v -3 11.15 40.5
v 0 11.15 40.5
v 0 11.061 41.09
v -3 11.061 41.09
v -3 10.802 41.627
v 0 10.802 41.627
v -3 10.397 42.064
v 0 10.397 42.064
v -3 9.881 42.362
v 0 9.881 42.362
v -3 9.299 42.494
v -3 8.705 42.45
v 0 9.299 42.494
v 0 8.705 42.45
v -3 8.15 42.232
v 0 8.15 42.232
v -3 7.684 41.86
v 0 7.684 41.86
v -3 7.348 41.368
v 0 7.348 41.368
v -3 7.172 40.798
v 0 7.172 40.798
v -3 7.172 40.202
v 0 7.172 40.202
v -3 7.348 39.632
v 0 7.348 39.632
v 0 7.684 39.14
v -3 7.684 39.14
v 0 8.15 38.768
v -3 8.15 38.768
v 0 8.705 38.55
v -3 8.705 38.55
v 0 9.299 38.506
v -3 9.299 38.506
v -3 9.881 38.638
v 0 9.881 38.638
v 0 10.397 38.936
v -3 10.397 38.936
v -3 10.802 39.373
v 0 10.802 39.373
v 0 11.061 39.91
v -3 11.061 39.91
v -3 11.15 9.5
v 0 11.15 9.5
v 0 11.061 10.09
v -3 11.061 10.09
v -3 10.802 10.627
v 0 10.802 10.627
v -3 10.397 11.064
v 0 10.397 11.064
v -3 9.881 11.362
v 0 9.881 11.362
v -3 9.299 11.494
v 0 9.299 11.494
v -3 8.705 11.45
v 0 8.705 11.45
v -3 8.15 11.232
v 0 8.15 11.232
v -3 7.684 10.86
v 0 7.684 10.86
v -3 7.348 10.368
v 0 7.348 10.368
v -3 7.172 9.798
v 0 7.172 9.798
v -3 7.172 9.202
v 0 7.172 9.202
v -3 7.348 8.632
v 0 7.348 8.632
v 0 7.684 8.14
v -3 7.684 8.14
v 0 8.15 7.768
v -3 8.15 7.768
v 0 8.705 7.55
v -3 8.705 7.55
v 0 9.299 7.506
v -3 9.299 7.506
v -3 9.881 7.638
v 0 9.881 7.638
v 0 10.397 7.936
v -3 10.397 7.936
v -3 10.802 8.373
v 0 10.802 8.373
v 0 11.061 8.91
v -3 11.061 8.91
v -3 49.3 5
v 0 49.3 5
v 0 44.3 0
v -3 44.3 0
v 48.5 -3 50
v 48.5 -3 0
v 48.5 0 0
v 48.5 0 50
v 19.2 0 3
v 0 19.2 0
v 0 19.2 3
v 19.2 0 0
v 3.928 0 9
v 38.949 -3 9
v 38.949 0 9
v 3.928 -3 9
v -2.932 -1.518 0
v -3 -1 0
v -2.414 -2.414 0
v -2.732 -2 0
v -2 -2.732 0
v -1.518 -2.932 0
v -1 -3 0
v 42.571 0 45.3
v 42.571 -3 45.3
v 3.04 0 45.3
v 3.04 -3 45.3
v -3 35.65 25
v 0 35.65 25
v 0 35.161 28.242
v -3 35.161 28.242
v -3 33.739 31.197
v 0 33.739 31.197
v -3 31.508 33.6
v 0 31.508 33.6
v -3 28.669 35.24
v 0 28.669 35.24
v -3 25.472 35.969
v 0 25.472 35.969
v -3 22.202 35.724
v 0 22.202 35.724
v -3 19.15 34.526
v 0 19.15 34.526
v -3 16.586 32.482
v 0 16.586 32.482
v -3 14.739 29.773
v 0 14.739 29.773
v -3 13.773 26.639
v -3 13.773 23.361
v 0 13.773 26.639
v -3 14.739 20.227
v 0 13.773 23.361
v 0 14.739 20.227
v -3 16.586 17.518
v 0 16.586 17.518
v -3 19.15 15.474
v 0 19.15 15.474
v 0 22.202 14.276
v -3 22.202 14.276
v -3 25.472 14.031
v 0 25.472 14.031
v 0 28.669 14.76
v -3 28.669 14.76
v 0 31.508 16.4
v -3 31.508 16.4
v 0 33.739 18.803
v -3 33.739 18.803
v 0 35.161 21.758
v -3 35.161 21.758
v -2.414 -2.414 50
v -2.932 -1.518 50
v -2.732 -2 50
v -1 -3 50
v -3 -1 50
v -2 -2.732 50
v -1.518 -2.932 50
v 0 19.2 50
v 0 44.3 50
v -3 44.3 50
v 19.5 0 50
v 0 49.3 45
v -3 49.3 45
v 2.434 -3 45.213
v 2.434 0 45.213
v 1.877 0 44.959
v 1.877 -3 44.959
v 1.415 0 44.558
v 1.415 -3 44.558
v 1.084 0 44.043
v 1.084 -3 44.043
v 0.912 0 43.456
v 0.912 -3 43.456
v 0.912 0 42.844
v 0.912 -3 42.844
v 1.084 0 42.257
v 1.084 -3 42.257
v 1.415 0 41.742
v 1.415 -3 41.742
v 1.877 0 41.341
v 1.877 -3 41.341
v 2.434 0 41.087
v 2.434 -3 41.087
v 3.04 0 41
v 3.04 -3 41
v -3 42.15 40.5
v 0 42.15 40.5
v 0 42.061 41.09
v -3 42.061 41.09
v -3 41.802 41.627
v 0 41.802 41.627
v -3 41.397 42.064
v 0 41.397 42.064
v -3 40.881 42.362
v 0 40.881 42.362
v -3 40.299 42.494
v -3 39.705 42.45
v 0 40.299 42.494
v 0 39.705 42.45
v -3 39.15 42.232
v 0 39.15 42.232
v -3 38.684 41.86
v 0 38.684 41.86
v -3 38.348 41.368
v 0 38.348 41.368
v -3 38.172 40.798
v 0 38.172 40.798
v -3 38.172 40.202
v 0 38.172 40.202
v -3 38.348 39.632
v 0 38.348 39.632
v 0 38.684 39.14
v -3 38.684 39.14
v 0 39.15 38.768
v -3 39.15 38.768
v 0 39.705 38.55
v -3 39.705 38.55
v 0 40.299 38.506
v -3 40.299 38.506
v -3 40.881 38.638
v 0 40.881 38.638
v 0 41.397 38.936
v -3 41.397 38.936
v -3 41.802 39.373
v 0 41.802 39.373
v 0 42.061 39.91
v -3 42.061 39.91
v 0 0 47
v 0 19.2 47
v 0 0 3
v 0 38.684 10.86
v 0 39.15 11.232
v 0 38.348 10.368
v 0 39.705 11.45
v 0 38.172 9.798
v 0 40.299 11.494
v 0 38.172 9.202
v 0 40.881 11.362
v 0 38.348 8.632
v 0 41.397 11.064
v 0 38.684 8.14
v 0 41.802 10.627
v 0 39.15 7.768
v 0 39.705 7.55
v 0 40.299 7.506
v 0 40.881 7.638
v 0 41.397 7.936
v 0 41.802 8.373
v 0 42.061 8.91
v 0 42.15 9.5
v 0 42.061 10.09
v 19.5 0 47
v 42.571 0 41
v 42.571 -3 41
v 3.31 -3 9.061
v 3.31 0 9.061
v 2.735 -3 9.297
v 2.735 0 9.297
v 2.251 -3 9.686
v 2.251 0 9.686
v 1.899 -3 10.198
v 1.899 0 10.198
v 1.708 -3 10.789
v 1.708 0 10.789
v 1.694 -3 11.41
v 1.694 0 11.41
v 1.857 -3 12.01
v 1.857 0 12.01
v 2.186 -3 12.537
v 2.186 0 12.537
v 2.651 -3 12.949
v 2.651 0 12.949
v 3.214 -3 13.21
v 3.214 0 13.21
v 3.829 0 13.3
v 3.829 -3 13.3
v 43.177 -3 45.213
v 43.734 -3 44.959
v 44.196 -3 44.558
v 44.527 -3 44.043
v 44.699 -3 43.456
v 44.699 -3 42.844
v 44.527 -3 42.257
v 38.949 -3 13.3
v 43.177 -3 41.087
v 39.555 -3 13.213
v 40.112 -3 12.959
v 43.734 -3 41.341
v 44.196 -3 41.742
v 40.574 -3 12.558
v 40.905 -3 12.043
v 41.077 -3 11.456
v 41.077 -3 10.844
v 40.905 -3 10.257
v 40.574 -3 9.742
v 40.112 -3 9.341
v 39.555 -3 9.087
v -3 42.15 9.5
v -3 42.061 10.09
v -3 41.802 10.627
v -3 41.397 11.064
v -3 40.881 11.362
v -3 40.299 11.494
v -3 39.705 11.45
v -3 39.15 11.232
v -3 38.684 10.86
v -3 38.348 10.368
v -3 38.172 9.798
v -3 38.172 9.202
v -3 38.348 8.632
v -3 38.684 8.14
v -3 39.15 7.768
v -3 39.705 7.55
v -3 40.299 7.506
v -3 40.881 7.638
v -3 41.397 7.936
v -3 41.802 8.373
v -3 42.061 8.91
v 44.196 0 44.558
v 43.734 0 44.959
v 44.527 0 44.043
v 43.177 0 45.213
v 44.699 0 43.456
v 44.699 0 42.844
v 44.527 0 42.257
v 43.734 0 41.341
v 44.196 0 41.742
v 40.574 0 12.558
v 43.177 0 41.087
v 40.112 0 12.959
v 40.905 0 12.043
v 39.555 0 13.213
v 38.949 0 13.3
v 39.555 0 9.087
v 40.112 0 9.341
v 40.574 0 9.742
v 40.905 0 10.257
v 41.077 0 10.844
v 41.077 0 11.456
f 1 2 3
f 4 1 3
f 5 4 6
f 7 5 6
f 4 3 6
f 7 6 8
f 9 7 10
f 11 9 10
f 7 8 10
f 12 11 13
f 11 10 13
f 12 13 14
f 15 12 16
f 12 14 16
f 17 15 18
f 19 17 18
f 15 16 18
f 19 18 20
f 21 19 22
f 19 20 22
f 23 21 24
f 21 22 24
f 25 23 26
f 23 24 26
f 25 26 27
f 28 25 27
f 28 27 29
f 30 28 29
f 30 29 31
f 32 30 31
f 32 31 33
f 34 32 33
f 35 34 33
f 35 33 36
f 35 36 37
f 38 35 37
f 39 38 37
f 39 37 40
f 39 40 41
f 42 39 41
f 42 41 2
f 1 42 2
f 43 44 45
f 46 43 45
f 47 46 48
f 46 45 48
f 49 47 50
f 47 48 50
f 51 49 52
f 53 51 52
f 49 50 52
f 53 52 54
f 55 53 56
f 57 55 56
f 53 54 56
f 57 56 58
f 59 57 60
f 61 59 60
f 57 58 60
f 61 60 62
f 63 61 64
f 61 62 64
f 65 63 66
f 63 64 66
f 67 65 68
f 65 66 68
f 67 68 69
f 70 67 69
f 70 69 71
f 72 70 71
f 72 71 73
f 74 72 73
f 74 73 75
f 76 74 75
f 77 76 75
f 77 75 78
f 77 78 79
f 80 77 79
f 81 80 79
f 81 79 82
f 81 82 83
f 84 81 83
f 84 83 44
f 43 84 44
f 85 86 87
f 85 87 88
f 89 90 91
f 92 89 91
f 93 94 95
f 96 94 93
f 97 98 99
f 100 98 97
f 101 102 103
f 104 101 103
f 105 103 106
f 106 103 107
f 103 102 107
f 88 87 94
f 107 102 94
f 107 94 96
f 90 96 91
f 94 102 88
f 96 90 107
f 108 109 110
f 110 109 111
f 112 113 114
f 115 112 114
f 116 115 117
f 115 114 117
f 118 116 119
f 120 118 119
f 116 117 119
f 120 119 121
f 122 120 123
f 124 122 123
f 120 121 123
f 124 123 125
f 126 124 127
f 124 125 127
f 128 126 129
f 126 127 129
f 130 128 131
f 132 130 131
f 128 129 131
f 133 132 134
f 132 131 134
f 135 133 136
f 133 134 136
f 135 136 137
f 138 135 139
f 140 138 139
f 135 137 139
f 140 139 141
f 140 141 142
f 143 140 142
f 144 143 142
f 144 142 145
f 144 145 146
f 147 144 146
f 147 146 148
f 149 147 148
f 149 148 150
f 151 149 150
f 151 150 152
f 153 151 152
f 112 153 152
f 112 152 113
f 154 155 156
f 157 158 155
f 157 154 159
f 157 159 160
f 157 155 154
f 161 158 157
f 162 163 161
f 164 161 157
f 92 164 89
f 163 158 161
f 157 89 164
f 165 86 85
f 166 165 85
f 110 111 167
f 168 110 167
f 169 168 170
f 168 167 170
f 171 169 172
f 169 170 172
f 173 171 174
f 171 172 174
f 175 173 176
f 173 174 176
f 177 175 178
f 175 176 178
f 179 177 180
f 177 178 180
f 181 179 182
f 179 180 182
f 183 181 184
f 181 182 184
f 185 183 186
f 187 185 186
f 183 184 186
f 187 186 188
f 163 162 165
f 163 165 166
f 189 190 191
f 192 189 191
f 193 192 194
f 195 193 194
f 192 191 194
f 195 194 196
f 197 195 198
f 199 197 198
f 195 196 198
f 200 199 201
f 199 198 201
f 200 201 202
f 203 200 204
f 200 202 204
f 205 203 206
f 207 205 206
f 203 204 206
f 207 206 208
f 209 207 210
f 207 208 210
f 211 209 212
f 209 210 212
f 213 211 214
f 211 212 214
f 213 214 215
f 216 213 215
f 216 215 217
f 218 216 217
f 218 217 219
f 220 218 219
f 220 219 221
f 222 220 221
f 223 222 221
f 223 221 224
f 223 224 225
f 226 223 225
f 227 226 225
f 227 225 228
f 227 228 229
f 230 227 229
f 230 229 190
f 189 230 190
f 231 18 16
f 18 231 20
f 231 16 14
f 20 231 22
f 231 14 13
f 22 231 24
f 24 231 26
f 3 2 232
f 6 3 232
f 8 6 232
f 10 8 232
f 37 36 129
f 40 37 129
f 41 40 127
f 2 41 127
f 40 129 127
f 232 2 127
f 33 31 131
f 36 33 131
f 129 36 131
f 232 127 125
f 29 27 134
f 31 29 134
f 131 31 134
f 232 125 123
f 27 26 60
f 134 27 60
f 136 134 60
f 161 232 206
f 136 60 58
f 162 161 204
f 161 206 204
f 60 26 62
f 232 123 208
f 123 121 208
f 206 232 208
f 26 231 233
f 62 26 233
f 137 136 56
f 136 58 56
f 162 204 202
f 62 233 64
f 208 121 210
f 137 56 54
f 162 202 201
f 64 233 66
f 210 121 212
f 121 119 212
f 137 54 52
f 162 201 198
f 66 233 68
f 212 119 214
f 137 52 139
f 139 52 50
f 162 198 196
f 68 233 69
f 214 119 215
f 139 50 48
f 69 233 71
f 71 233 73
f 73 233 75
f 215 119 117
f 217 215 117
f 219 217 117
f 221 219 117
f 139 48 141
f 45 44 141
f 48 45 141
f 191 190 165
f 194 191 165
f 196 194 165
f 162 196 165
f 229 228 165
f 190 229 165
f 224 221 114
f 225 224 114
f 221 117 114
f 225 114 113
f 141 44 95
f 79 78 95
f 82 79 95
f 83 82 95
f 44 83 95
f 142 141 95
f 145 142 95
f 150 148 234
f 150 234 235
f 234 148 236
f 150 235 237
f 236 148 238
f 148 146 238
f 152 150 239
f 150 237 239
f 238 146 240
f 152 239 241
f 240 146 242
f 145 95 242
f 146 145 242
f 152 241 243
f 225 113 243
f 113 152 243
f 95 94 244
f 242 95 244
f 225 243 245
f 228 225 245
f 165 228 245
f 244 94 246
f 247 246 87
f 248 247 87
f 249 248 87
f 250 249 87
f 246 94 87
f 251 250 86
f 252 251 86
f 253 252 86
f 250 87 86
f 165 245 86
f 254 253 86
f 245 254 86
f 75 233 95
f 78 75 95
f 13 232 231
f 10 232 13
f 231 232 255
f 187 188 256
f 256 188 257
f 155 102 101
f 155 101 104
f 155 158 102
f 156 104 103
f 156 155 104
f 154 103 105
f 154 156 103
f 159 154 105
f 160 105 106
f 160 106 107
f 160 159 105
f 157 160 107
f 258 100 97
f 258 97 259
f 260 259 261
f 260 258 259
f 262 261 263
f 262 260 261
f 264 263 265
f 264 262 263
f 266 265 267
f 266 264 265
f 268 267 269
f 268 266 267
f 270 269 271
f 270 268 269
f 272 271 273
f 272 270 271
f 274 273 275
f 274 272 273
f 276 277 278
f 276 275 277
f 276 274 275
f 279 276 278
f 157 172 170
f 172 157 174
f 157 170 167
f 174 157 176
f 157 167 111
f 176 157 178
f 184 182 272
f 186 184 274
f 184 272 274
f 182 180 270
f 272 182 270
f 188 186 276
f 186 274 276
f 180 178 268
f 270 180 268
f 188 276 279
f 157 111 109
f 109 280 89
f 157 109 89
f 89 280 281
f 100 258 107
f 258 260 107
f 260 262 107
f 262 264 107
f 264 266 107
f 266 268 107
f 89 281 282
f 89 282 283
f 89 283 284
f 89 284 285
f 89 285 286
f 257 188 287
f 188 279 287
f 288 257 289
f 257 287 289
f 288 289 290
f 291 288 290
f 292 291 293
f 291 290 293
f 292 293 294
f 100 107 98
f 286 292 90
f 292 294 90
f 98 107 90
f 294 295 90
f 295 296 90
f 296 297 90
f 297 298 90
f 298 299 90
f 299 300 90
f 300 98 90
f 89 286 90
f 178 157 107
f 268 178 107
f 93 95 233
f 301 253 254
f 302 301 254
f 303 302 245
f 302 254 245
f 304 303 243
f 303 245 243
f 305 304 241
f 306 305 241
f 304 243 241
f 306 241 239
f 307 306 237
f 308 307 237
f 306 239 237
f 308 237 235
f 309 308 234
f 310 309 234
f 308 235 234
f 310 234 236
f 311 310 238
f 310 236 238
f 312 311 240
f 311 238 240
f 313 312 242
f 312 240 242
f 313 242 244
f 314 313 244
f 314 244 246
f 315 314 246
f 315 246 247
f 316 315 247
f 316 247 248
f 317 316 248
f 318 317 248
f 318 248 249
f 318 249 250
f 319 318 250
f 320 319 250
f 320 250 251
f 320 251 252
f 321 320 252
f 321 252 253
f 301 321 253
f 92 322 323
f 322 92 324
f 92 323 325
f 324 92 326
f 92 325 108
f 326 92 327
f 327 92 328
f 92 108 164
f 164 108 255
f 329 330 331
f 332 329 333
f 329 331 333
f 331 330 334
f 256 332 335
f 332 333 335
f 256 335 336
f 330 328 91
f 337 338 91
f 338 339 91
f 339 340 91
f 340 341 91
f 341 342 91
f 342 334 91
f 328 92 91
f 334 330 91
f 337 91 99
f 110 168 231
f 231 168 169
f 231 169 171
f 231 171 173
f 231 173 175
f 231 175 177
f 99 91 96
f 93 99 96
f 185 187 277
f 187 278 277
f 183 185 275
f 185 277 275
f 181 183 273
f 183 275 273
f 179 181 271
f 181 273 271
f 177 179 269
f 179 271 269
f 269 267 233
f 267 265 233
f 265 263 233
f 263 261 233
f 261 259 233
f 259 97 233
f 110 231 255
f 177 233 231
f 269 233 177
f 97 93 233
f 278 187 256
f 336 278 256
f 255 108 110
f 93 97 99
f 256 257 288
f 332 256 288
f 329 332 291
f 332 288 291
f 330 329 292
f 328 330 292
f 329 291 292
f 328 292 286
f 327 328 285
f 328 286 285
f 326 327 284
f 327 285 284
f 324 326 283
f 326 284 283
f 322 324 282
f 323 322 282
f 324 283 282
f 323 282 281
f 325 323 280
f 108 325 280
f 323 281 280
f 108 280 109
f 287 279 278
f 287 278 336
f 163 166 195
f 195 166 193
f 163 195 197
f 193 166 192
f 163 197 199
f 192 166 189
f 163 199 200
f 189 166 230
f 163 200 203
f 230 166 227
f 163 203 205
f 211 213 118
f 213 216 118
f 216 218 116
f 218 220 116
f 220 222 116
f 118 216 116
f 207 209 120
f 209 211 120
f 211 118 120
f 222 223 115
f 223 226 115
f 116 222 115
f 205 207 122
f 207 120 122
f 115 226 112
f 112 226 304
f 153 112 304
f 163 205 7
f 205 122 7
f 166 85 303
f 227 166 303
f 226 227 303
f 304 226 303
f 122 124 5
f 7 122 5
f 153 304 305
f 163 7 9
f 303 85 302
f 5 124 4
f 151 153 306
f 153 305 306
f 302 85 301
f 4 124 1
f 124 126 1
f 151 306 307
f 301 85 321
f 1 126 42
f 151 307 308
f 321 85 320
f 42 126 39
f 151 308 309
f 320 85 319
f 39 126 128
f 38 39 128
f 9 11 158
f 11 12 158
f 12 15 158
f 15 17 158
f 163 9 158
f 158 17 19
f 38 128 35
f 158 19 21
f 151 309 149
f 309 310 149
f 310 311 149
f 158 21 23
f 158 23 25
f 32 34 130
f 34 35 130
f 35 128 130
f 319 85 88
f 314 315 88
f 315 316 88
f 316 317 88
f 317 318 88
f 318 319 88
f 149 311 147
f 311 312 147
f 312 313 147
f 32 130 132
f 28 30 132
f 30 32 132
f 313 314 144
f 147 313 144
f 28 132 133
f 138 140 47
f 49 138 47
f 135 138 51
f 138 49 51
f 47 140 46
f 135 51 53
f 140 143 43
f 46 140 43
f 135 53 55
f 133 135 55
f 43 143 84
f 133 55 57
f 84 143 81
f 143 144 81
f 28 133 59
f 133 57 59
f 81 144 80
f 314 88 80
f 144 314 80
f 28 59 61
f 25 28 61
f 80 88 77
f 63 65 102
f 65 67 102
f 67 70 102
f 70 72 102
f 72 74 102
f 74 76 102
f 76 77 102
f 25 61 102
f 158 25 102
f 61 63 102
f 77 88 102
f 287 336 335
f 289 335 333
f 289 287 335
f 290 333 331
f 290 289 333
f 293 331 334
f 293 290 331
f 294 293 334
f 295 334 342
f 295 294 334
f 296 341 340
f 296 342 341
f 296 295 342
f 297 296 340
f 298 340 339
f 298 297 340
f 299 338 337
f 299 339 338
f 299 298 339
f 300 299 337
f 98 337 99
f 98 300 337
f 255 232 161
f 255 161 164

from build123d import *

# Parameters (mm, degrees)
BOSS_EXTRUDE1_DEPTH = 50
RIB1_REACH          = 87.339
SKETCH8_WALL_W      = 200.043796972
SKETCH8_WALL_H      = 3
RIB2_REACH          = 87.339
SKETCH10_WALL_W     = 199.830842734
SKETCH10_WALL_H     = 3
FILLET1_R           = 2
SKETCH11_R          = 11
SKETCH11_R_2        = 2
CUT_EXTRUDE1_DEPTH  = 50
CHAMFER1_SIZE       = 5
CUT_EXTRUDE2_DEPTH  = 50


with BuildPart() as part:
    # Sketch1 → Boss-Extrude1 (new body)
    with BuildSketch(Plane.XY):
        Polygon((0, 0), (0, 49.3), (-3, 49.3), (-3, -3), (48.5, -3), (48.5, 0), align=None)
    extrude(amount=BOSS_EXTRUDE1_DEPTH)

    # Sketch8 wall → Rib1 (add, up to next)
    with BuildSketch(Plane(origin=(9.75, 9.6, 50), x_dir=(0.712566819448, -0.701604252995, 0), z_dir=(0.701604252995, 0.712566819448, 0)), mode=Mode.PRIVATE) as rib1_sk1:
        with Locations((0, 1.5)):
            Rectangle(SKETCH8_WALL_W, SKETCH8_WALL_H)
    rib1_tool1 = extrude(rib1_sk1.sketch, amount=-RIB1_REACH, mode=Mode.PRIVATE) - part.part
    add(rib1_tool1.solids().sort_by_distance((9.75, 9.6, 50))[0])

    # Sketch10 wall → Rib2 (add, up to next)
    with BuildSketch(Plane(origin=(9.6, 9.6, 0), x_dir=(0.707106781187, -0.707106781187, 0), z_dir=(0.707106781187, 0.707106781187, 0)), mode=Mode.PRIVATE) as rib2_sk1:
        with Locations((0, -1.5)):
            Rectangle(SKETCH10_WALL_W, SKETCH10_WALL_H)
    rib2_tool1 = extrude(rib2_sk1.sketch, amount=-RIB2_REACH, mode=Mode.PRIVATE) - part.part
    add(rib2_tool1.solids().sort_by_distance((9.6, 9.6, 0))[0])

    # Fillet1
    fillet1_edges = [part.edges().sort_by_distance(p)[0] for p in [
        (-3, -3, 25),
    ]]
    fillet(fillet1_edges, radius=FILLET1_R)

    # Sketch11 → Cut-Extrude1 (cut)
    with BuildSketch(Plane(origin=(0, 0, 0), x_dir=(0, 0, -1), z_dir=(1, 0, 0))):
        with Locations(Location((-25, 24.65, 0), (0, 0, 90))):
            Circle(SKETCH11_R)
        with Locations(Location((-40.5, 40.15, 0), (0, 0, 90))):
            Circle(SKETCH11_R_2)
        with Locations(Location((-9.5, 40.15, 0), (0, 0, 90))):
            Circle(SKETCH11_R_2)
        with Locations(Location((-9.5, 9.15, 0), (0, 0, 90))):
            Circle(SKETCH11_R_2)
        with Locations(Location((-40.5, 9.15, 0), (0, 0, 90))):
            Circle(SKETCH11_R_2)
    extrude(amount=-CUT_EXTRUDE1_DEPTH, mode=Mode.SUBTRACT)

    # Chamfer1
    chamfer1_edges = [part.edges().sort_by_distance(p)[0] for p in [
        (-1.5, 49.3, 50),
        (-1.5, 49.3, 0),
    ]]
    chamfer(chamfer1_edges, length=CHAMFER1_SIZE)

    # Sketch12 → Cut-Extrude2 (cut)
    with BuildSketch(Plane.XZ.offset(3)):
        with BuildLine():
            Line((38.94922721, 9), (3.928025493, 9))
            ThreePointArc((3.928025493, 9), (1.678310919, 11.099272288), (3.828882318, 13.3))
            Line((3.828882318, 13.3), (38.94922721, 13.3))
            ThreePointArc((38.94922721, 13.3), (41.09922721, 11.15), (38.94922721, 9))
        make_face()
        with BuildLine():
            Line((3.039672714, 41), (42.571371384, 41))
            ThreePointArc((42.571371384, 41), (44.721371384, 43.15), (42.571371384, 45.3))
            Line((42.571371384, 45.3), (3.039672714, 45.3))
            ThreePointArc((3.039672714, 45.3), (0.889672714, 43.15), (3.039672714, 41))
        make_face()
    extrude(amount=-CUT_EXTRUDE2_DEPTH, mode=Mode.SUBTRACT)


solid = part.part
